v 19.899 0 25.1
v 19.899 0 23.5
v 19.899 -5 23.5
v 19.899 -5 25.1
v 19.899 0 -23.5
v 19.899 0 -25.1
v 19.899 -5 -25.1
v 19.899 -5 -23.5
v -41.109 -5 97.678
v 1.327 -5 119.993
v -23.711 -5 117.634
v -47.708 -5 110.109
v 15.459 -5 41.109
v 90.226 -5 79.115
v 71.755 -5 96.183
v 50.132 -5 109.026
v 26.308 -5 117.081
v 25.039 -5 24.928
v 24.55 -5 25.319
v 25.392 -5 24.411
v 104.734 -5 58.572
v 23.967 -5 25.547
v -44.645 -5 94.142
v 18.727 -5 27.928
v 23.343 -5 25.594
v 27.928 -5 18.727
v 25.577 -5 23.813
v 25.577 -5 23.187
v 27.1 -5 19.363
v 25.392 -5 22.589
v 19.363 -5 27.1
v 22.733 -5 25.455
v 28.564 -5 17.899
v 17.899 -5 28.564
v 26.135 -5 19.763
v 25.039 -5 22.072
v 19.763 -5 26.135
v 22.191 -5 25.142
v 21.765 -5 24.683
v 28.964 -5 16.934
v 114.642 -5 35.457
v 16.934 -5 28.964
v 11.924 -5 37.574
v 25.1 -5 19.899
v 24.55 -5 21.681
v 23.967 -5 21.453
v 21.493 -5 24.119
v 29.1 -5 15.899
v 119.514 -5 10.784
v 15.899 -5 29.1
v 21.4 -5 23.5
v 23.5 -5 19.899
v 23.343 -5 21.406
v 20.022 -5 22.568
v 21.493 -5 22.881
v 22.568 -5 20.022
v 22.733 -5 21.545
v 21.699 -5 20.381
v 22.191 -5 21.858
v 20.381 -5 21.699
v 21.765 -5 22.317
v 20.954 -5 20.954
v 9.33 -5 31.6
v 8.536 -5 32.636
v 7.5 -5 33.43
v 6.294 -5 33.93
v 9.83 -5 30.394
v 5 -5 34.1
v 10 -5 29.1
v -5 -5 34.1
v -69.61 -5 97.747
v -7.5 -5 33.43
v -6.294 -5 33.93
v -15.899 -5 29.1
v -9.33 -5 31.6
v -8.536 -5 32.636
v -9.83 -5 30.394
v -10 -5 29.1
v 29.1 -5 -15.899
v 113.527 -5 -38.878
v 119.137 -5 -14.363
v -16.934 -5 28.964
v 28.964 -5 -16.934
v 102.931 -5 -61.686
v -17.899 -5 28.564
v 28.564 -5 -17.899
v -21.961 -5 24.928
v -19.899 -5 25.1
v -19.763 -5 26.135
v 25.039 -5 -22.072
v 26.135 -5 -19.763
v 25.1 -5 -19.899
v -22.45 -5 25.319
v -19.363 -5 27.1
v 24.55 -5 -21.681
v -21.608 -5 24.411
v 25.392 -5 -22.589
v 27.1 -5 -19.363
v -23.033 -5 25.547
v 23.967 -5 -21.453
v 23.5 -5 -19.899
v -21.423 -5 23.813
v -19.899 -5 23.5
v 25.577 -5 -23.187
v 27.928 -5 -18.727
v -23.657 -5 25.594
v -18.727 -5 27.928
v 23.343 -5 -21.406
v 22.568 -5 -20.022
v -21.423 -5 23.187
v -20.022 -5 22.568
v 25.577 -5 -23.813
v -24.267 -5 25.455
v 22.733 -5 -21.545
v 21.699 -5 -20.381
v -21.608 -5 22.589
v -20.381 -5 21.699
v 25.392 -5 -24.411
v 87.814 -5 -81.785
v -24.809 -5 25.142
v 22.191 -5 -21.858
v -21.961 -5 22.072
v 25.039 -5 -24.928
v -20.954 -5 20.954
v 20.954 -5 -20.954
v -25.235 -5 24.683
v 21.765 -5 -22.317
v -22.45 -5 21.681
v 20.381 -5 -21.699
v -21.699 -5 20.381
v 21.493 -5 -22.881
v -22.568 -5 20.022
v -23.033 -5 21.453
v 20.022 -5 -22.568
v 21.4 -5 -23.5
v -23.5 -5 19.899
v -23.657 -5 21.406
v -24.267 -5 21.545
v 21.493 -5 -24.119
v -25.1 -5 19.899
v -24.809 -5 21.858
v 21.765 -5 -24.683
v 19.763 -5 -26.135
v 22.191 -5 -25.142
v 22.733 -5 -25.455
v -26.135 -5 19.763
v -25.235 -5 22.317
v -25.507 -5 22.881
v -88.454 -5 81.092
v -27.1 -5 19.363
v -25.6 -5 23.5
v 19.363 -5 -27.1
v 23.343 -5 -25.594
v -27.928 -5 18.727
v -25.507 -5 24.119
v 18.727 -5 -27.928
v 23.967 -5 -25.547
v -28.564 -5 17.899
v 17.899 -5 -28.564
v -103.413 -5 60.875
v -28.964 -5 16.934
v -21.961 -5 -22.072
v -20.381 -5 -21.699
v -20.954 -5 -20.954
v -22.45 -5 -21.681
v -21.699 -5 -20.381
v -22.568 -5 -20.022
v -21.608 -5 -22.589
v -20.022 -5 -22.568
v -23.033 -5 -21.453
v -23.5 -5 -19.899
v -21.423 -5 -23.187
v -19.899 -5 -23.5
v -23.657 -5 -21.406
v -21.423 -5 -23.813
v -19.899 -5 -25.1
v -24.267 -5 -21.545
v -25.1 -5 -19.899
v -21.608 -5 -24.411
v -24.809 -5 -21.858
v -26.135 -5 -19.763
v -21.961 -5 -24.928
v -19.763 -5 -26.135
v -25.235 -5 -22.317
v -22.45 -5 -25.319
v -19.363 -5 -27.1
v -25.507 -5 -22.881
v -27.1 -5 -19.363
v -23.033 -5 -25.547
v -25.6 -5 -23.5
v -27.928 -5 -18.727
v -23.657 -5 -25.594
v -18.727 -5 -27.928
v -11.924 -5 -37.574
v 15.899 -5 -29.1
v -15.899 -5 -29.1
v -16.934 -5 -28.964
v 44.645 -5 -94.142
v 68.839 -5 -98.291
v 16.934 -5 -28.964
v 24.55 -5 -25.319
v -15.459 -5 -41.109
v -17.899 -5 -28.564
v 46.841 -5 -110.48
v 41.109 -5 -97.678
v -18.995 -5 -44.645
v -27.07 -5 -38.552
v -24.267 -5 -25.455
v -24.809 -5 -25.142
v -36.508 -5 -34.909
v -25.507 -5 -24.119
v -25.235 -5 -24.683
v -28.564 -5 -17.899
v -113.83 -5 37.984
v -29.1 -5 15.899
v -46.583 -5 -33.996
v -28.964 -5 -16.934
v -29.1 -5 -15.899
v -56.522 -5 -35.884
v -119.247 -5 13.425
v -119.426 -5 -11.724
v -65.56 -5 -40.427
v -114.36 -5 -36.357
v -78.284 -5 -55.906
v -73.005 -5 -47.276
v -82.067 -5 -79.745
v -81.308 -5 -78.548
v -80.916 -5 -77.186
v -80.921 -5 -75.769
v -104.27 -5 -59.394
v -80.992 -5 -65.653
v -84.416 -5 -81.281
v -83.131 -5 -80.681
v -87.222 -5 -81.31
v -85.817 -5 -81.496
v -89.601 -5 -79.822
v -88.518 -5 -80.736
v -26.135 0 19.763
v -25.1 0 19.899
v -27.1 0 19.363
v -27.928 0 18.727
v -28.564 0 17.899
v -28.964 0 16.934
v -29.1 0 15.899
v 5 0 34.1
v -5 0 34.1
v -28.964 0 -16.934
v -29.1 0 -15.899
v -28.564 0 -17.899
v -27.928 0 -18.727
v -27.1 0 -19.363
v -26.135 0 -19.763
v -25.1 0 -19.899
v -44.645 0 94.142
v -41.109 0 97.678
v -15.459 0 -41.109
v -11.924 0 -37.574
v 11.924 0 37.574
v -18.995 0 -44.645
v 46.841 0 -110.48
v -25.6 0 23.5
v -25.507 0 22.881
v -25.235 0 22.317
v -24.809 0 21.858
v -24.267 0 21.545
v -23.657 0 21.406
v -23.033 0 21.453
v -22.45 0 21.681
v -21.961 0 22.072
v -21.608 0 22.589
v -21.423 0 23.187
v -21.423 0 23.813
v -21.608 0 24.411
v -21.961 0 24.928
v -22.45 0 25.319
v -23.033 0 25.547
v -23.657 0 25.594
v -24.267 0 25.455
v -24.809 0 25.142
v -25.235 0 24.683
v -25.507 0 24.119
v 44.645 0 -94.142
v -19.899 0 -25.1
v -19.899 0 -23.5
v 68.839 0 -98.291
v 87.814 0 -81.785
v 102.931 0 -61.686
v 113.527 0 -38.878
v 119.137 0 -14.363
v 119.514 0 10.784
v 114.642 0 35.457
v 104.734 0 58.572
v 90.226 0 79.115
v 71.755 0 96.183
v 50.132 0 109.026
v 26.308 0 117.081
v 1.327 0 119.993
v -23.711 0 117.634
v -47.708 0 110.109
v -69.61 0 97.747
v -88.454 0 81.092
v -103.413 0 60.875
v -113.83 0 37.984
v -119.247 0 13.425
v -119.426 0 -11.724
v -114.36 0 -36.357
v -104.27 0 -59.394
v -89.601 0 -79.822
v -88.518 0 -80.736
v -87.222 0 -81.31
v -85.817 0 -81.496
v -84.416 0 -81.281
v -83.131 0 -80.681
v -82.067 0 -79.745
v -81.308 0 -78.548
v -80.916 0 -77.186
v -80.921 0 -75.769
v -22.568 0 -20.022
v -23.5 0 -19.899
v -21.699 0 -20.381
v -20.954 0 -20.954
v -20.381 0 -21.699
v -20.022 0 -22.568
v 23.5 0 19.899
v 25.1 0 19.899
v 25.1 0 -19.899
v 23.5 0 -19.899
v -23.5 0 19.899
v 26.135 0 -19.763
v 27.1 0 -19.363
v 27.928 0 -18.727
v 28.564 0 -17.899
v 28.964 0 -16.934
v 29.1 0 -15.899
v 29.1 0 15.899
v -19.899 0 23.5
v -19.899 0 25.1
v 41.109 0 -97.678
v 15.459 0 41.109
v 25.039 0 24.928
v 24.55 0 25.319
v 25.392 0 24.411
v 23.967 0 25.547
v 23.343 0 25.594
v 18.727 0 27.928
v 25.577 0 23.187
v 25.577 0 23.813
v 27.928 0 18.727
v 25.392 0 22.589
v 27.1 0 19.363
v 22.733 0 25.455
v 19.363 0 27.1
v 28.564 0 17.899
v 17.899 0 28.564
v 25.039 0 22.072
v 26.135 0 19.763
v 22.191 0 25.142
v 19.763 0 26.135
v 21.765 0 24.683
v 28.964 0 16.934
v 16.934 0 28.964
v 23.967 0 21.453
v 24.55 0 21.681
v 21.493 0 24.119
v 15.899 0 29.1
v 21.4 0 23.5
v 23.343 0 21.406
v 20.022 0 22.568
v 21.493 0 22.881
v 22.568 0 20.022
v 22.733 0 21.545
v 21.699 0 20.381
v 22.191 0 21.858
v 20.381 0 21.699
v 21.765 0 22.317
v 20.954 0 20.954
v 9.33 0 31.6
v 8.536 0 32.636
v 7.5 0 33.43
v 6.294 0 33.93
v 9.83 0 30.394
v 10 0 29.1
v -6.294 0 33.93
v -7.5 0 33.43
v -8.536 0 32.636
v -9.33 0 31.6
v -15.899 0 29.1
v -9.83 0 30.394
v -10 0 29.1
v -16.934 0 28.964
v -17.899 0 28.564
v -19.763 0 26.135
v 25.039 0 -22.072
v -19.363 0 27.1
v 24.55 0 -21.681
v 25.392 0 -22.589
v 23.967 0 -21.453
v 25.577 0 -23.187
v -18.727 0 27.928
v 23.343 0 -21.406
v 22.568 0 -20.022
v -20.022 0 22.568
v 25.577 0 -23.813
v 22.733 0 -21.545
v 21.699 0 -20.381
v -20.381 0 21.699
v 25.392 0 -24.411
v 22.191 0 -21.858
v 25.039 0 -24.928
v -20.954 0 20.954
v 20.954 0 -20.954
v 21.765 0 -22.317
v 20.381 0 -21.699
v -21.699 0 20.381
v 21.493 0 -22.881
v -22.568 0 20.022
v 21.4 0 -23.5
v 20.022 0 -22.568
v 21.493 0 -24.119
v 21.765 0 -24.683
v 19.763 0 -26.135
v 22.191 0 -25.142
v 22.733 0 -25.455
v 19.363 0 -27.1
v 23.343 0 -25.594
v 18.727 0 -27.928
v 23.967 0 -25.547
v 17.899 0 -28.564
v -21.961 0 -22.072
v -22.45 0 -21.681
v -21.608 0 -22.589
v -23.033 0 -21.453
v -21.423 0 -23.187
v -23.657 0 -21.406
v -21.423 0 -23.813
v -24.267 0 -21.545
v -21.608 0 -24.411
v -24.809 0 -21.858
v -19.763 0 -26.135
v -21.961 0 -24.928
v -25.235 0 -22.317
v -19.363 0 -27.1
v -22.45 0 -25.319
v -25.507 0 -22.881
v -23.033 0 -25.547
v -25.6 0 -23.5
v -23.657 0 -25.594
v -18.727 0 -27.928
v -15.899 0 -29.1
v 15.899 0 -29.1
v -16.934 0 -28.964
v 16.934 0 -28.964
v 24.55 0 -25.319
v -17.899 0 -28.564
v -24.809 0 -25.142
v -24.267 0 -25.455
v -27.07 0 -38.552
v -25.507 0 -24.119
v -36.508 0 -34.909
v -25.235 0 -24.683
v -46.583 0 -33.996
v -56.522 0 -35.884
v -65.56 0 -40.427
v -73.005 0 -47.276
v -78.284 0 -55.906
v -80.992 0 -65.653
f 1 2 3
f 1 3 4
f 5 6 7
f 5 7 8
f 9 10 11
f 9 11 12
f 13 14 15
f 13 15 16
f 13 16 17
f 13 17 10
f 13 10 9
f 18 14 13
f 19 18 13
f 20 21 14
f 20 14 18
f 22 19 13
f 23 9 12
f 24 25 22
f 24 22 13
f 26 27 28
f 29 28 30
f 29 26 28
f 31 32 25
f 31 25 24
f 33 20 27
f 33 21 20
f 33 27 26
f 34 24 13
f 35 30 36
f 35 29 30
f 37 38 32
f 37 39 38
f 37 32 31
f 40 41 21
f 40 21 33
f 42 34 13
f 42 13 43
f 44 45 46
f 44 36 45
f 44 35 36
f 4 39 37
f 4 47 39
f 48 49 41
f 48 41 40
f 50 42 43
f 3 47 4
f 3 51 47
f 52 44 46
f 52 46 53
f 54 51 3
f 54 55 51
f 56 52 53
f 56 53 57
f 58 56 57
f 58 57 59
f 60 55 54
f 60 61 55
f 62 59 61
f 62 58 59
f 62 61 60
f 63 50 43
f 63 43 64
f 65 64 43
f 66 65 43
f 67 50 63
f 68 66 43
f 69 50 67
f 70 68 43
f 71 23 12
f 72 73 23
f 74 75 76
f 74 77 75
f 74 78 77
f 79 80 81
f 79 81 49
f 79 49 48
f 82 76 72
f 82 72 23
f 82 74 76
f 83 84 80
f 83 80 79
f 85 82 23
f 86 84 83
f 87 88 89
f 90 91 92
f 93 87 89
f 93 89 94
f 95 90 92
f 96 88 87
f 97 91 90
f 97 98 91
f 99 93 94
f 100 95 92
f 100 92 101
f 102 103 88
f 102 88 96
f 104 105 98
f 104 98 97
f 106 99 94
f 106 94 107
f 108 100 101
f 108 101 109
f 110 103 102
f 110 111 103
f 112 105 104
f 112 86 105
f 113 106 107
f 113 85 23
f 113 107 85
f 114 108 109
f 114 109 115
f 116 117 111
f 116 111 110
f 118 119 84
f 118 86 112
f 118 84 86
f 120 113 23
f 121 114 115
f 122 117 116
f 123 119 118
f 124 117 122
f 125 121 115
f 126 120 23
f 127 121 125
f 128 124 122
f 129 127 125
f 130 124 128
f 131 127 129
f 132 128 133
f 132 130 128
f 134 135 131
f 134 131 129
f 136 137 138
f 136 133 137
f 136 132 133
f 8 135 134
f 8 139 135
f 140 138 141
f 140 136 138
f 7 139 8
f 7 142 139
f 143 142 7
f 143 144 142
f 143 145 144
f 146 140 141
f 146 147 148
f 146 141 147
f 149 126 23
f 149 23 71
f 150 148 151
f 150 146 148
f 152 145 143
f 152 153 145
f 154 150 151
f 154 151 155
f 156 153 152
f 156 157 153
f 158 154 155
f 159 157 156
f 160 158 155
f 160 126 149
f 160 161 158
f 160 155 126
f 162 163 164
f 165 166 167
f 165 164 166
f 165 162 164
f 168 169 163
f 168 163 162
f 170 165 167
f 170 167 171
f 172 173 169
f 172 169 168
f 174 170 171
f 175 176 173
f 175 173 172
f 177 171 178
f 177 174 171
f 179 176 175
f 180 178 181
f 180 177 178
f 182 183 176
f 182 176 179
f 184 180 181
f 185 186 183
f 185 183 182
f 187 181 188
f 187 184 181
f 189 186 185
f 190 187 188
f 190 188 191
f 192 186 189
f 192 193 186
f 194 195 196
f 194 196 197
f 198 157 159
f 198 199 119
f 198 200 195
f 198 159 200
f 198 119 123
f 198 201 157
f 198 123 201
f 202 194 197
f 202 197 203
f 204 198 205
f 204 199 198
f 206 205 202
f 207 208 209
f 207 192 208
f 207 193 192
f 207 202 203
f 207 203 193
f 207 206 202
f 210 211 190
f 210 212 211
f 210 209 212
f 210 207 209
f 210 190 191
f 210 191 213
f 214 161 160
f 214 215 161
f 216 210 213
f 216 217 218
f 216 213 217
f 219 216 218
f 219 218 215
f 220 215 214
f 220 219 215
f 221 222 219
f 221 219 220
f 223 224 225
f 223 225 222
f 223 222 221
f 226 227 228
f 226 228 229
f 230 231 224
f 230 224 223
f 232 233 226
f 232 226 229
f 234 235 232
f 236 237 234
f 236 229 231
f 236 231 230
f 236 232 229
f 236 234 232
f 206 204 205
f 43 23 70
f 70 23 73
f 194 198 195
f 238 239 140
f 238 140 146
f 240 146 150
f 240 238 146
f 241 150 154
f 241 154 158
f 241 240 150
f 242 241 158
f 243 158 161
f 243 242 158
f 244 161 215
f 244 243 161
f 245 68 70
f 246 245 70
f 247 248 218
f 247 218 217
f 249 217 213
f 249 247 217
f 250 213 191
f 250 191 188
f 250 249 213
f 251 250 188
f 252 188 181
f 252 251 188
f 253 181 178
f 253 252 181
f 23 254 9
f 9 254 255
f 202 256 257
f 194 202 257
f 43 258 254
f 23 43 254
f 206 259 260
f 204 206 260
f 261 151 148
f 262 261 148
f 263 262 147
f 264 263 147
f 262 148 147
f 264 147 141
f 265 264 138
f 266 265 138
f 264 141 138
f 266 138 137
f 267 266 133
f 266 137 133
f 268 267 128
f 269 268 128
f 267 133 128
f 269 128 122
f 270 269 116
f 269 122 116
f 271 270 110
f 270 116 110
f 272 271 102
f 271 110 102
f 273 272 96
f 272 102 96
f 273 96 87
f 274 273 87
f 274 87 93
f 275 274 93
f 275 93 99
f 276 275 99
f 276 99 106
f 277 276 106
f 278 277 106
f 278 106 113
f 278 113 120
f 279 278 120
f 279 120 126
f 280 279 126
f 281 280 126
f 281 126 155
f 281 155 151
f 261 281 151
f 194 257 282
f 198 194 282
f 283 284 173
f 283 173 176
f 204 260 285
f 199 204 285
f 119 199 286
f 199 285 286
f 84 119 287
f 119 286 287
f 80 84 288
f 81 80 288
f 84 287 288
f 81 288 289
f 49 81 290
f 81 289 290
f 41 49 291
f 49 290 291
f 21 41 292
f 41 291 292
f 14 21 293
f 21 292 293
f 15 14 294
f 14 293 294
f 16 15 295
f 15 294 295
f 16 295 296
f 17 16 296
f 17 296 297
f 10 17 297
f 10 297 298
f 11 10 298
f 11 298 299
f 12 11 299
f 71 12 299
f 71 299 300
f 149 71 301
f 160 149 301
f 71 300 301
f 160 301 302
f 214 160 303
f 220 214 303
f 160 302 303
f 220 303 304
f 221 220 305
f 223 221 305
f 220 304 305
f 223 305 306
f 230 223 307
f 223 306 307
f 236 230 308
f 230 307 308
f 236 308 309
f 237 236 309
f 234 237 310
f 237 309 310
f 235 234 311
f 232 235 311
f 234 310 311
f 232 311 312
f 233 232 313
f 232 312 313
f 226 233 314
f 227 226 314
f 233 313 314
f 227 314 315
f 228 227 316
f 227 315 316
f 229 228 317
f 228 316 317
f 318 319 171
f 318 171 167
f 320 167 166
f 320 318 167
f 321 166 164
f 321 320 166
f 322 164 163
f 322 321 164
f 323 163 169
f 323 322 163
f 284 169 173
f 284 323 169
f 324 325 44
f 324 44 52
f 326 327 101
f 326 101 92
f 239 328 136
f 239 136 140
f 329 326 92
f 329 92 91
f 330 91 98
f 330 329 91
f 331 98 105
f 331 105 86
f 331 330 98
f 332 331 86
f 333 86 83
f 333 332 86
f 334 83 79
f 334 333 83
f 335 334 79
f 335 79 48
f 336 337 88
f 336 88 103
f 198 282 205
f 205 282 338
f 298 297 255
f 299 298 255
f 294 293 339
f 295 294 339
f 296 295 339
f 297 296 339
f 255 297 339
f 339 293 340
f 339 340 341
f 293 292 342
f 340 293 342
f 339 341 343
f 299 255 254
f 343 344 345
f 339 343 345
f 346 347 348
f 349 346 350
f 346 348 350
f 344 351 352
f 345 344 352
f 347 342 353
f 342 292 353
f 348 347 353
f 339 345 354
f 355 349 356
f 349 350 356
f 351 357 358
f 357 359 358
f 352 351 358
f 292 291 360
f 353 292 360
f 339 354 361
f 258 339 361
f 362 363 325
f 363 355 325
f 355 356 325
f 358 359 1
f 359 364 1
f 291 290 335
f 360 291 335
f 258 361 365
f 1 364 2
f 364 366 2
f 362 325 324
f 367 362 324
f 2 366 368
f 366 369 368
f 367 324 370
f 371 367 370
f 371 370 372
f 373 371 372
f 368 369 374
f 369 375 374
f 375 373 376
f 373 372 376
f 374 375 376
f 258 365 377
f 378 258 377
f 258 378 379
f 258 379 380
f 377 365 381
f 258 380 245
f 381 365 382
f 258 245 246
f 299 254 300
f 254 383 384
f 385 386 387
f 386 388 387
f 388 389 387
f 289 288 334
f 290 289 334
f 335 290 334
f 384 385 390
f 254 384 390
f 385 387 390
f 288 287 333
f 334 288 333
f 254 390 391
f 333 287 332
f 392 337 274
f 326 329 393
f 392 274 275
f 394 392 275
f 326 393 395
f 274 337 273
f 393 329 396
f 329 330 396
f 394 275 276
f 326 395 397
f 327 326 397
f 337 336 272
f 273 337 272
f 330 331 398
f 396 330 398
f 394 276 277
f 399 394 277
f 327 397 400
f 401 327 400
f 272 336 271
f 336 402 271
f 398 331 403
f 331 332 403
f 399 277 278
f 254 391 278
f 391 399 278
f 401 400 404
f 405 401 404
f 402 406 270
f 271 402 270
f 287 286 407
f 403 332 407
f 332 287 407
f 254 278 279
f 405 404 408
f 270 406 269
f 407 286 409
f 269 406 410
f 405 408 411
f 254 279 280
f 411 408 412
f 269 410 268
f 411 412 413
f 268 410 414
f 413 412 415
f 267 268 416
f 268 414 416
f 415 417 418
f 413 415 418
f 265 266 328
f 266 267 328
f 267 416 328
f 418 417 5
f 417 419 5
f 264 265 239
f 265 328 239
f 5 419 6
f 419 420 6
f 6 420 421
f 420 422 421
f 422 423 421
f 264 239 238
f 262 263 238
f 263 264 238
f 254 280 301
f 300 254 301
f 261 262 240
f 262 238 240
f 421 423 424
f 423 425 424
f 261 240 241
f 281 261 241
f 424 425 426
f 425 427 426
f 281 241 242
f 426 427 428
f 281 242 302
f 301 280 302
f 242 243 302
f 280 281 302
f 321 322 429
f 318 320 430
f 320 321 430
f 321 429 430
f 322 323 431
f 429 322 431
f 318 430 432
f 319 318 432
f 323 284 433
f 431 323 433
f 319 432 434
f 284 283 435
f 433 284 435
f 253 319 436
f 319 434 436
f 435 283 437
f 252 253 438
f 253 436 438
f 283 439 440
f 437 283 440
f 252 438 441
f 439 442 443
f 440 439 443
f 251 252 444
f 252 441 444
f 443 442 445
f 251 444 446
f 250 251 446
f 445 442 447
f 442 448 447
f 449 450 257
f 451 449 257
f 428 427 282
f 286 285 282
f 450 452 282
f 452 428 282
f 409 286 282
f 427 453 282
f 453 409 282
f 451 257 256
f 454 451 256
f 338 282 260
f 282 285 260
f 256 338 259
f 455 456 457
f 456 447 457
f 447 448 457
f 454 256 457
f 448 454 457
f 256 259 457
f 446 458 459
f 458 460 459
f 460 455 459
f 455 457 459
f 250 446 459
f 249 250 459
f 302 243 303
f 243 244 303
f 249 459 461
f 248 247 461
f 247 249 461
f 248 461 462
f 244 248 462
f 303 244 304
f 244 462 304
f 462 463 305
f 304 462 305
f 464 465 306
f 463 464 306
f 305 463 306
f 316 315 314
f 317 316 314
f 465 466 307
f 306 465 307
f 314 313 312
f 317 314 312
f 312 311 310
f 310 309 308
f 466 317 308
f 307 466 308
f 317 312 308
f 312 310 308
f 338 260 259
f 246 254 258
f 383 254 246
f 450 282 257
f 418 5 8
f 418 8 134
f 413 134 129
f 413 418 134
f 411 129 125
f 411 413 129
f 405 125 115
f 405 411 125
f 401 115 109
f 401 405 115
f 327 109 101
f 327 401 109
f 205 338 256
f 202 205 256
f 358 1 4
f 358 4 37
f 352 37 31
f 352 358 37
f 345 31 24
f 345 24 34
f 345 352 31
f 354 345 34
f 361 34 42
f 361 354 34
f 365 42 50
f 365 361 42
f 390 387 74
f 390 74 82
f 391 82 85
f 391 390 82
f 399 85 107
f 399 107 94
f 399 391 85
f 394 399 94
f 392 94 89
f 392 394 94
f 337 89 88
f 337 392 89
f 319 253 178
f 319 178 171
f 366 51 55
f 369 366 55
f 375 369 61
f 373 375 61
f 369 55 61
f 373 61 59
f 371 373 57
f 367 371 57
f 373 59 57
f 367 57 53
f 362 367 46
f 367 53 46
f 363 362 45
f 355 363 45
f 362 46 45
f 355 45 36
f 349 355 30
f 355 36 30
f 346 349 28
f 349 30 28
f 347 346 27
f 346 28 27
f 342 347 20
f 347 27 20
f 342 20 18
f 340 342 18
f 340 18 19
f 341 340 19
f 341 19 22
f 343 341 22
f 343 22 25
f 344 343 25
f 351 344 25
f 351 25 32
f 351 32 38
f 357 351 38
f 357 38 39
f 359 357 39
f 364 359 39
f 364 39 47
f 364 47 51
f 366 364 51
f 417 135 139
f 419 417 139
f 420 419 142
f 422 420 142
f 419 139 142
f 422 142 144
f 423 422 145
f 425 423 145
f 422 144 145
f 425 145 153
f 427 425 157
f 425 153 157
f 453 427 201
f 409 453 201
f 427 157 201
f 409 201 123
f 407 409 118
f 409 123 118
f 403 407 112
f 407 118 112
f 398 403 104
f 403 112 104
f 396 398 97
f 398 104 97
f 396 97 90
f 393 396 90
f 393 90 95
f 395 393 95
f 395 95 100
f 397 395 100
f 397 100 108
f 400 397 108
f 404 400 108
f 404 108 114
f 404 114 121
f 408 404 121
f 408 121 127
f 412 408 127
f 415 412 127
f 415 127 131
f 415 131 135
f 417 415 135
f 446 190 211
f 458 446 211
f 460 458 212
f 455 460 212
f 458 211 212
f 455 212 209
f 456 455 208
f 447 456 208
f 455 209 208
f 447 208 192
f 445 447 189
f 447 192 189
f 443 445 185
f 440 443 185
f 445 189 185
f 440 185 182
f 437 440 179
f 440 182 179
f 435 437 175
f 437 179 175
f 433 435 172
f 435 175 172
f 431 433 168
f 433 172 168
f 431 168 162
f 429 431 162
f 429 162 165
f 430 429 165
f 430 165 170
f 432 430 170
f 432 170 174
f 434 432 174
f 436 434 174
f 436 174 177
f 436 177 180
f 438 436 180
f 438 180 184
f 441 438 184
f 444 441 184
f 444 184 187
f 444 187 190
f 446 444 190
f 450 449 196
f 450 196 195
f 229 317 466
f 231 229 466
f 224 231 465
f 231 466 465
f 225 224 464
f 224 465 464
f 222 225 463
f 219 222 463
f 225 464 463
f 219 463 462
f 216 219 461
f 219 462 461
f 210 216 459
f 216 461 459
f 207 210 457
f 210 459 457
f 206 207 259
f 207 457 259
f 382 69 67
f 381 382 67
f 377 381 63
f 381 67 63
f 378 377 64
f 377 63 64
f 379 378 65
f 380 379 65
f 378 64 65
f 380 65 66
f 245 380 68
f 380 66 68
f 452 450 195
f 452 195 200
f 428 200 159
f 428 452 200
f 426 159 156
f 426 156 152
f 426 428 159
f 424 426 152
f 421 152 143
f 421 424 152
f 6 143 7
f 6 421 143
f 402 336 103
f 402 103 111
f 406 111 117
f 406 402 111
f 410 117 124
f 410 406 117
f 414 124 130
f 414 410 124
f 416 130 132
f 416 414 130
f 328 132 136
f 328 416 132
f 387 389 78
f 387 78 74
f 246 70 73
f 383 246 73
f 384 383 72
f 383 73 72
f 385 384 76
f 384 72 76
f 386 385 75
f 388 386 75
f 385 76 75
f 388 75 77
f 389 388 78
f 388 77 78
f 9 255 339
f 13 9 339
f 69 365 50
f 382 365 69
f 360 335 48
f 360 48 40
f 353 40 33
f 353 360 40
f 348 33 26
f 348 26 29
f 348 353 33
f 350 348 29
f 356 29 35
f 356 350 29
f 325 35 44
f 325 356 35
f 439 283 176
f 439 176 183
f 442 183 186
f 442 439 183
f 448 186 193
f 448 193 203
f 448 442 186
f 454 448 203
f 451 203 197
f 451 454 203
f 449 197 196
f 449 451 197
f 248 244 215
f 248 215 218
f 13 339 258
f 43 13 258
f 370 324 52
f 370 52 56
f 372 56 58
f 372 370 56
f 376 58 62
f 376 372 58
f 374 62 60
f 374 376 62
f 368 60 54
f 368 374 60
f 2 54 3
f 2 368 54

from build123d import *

# Parameters (mm, degrees)
EXTRUDE_1_DEPTH          = 5
CUT_EXTRUDE_1_DEPTH      = 170.779268463
CUT_EXTRUDE_1_DEPTH_BACK = 170.779268463
HOLE_WIZARD_M5_1_D       = 4.2


with BuildPart() as part:
    # 草圖1 → 填料-伸長1 (new body)
    with BuildSketch(Plane(origin=(0, 0, 0), x_dir=(1, 0, 0), z_dir=(0, 1, 0))):
        with BuildLine():
            Line((46.840858459, 110.480468766), (-18.994949366, 44.644660941))
            ThreePointArc((-18.994949366, 44.644660941), (-61.199118411, 37.840868245), (-80.9211148, 75.768777998))
            ThreePointArc((-80.9211148, 75.768777998), (-83.752223837, 81.026793285), (-89.60126665, 79.822384171))
            ThreePointArc((-89.60126665, 79.822384171), (26.307654113, -117.080772696), (46.840858459, 110.480468766))
        make_face()
        Polygon((-41.109127035, -97.67766953), (-44.644660941, -94.142135624), (11.923881554, -37.573593129), (15.45941546, -41.109127035), align=None, mode=Mode.SUBTRACT)
        with BuildLine():
            ThreePointArc((-23.499999452, 19.89891353), (-20.953647337, 20.953647337), (-19.89891353, 23.499999452))
            Line((-19.89891353, 23.499999452), (-19.898913286, 25.100000259))
            ThreePointArc((-19.898913286, 25.100000259), (-18.727340196, 27.92842699), (-15.898913286, 29.09999965))
            Line((-15.898913286, 29.09999965), (15.898913286, 29.09999965))
            ThreePointArc((15.898913286, 29.09999965), (18.727340196, 27.92842699), (19.898913286, 25.100000259))
            Line((19.898913286, 25.100000259), (19.89891353, 23.499999452))
            ThreePointArc((19.89891353, 23.499999452), (20.953647337, 20.953647337), (23.499999452, 19.89891353))
            Line((23.499999452, 19.89891353), (25.100000259, 19.898913286))
            ThreePointArc((25.100000259, 19.898913286), (27.92842699, 18.727340196), (29.09999965, 15.898913286))
            Line((29.09999965, 15.898913286), (29.09999965, -15.898913286))
            ThreePointArc((29.09999965, -15.898913286), (27.92842699, -18.727340196), (25.100000259, -19.898913286))
            Line((25.100000259, -19.898913286), (23.499999452, -19.89891353))
            ThreePointArc((23.499999452, -19.89891353), (20.953647337, -20.953647337), (19.89891353, -23.499999452))
            Line((19.89891353, -23.499999452), (19.898913286, -25.100000259))
            ThreePointArc((19.898913286, -25.100000259), (18.727340196, -27.92842699), (15.898913286, -29.09999965))
            Line((15.898913286, -29.09999965), (-15.898913286, -29.09999965))
            ThreePointArc((-15.898913286, -29.09999965), (-18.727340196, -27.92842699), (-19.898913286, -25.100000259))
            Line((-19.898913286, -25.100000259), (-19.89891353, -23.499999452))
            ThreePointArc((-19.89891353, -23.499999452), (-20.953647337, -20.953647337), (-23.499999452, -19.89891353))
            Line((-23.499999452, -19.89891353), (-25.100000259, -19.898913286))
            ThreePointArc((-25.100000259, -19.898913286), (-27.92842699, -18.727340196), (-29.09999965, -15.898913286))
            Line((-29.09999965, -15.898913286), (-29.09999965, 15.898913286))
            ThreePointArc((-29.09999965, 15.898913286), (-27.92842699, 18.727340196), (-25.100000259, 19.898913286))
            Line((-25.100000259, 19.898913286), (-23.499999452, 19.89891353))
        make_face(mode=Mode.SUBTRACT)
        Polygon((44.644660941, 94.142135624), (-11.923881554, 37.573593129), (-15.45941546, 41.109127035), (41.109127035, 97.67766953), align=None, mode=Mode.SUBTRACT)
    extrude(amount=-EXTRUDE_1_DEPTH)

    # 草圖5 → 除料-伸長1 (cut, two sides: drawn at the far end of the back side and taken through both)
    with BuildSketch(Plane(origin=(0, 0, 0), x_dir=(1, 0, 0), z_dir=(0, 1, 0)).offset(-CUT_EXTRUDE_1_DEPTH_BACK)):
        with BuildLine():
            Line((-5, -24.09999965), (5, -24.09999965))
            ThreePointArc((5, -24.09999965), (10, -29.09999965), (5, -34.09999965))
            Line((5, -34.09999965), (-5, -34.09999965))
            ThreePointArc((-5, -34.09999965), (-10, -29.09999965), (-5, -24.09999965))
        make_face()
    extrude(amount=CUT_EXTRUDE_1_DEPTH + CUT_EXTRUDE_1_DEPTH_BACK, mode=Mode.SUBTRACT)

    # M5 螺紋孔1 (through all)
    with Locations(Plane(origin=(0, 0, 0), x_dir=(1, 0, 0), z_dir=(0, 1, 0))):
        with Locations((23.5, 23.5), (23.5, -23.5), (-23.5, -23.5), (-23.5, 23.5)):
            Hole(HOLE_WIZARD_M5_1_D / 2)


solid = part.part
